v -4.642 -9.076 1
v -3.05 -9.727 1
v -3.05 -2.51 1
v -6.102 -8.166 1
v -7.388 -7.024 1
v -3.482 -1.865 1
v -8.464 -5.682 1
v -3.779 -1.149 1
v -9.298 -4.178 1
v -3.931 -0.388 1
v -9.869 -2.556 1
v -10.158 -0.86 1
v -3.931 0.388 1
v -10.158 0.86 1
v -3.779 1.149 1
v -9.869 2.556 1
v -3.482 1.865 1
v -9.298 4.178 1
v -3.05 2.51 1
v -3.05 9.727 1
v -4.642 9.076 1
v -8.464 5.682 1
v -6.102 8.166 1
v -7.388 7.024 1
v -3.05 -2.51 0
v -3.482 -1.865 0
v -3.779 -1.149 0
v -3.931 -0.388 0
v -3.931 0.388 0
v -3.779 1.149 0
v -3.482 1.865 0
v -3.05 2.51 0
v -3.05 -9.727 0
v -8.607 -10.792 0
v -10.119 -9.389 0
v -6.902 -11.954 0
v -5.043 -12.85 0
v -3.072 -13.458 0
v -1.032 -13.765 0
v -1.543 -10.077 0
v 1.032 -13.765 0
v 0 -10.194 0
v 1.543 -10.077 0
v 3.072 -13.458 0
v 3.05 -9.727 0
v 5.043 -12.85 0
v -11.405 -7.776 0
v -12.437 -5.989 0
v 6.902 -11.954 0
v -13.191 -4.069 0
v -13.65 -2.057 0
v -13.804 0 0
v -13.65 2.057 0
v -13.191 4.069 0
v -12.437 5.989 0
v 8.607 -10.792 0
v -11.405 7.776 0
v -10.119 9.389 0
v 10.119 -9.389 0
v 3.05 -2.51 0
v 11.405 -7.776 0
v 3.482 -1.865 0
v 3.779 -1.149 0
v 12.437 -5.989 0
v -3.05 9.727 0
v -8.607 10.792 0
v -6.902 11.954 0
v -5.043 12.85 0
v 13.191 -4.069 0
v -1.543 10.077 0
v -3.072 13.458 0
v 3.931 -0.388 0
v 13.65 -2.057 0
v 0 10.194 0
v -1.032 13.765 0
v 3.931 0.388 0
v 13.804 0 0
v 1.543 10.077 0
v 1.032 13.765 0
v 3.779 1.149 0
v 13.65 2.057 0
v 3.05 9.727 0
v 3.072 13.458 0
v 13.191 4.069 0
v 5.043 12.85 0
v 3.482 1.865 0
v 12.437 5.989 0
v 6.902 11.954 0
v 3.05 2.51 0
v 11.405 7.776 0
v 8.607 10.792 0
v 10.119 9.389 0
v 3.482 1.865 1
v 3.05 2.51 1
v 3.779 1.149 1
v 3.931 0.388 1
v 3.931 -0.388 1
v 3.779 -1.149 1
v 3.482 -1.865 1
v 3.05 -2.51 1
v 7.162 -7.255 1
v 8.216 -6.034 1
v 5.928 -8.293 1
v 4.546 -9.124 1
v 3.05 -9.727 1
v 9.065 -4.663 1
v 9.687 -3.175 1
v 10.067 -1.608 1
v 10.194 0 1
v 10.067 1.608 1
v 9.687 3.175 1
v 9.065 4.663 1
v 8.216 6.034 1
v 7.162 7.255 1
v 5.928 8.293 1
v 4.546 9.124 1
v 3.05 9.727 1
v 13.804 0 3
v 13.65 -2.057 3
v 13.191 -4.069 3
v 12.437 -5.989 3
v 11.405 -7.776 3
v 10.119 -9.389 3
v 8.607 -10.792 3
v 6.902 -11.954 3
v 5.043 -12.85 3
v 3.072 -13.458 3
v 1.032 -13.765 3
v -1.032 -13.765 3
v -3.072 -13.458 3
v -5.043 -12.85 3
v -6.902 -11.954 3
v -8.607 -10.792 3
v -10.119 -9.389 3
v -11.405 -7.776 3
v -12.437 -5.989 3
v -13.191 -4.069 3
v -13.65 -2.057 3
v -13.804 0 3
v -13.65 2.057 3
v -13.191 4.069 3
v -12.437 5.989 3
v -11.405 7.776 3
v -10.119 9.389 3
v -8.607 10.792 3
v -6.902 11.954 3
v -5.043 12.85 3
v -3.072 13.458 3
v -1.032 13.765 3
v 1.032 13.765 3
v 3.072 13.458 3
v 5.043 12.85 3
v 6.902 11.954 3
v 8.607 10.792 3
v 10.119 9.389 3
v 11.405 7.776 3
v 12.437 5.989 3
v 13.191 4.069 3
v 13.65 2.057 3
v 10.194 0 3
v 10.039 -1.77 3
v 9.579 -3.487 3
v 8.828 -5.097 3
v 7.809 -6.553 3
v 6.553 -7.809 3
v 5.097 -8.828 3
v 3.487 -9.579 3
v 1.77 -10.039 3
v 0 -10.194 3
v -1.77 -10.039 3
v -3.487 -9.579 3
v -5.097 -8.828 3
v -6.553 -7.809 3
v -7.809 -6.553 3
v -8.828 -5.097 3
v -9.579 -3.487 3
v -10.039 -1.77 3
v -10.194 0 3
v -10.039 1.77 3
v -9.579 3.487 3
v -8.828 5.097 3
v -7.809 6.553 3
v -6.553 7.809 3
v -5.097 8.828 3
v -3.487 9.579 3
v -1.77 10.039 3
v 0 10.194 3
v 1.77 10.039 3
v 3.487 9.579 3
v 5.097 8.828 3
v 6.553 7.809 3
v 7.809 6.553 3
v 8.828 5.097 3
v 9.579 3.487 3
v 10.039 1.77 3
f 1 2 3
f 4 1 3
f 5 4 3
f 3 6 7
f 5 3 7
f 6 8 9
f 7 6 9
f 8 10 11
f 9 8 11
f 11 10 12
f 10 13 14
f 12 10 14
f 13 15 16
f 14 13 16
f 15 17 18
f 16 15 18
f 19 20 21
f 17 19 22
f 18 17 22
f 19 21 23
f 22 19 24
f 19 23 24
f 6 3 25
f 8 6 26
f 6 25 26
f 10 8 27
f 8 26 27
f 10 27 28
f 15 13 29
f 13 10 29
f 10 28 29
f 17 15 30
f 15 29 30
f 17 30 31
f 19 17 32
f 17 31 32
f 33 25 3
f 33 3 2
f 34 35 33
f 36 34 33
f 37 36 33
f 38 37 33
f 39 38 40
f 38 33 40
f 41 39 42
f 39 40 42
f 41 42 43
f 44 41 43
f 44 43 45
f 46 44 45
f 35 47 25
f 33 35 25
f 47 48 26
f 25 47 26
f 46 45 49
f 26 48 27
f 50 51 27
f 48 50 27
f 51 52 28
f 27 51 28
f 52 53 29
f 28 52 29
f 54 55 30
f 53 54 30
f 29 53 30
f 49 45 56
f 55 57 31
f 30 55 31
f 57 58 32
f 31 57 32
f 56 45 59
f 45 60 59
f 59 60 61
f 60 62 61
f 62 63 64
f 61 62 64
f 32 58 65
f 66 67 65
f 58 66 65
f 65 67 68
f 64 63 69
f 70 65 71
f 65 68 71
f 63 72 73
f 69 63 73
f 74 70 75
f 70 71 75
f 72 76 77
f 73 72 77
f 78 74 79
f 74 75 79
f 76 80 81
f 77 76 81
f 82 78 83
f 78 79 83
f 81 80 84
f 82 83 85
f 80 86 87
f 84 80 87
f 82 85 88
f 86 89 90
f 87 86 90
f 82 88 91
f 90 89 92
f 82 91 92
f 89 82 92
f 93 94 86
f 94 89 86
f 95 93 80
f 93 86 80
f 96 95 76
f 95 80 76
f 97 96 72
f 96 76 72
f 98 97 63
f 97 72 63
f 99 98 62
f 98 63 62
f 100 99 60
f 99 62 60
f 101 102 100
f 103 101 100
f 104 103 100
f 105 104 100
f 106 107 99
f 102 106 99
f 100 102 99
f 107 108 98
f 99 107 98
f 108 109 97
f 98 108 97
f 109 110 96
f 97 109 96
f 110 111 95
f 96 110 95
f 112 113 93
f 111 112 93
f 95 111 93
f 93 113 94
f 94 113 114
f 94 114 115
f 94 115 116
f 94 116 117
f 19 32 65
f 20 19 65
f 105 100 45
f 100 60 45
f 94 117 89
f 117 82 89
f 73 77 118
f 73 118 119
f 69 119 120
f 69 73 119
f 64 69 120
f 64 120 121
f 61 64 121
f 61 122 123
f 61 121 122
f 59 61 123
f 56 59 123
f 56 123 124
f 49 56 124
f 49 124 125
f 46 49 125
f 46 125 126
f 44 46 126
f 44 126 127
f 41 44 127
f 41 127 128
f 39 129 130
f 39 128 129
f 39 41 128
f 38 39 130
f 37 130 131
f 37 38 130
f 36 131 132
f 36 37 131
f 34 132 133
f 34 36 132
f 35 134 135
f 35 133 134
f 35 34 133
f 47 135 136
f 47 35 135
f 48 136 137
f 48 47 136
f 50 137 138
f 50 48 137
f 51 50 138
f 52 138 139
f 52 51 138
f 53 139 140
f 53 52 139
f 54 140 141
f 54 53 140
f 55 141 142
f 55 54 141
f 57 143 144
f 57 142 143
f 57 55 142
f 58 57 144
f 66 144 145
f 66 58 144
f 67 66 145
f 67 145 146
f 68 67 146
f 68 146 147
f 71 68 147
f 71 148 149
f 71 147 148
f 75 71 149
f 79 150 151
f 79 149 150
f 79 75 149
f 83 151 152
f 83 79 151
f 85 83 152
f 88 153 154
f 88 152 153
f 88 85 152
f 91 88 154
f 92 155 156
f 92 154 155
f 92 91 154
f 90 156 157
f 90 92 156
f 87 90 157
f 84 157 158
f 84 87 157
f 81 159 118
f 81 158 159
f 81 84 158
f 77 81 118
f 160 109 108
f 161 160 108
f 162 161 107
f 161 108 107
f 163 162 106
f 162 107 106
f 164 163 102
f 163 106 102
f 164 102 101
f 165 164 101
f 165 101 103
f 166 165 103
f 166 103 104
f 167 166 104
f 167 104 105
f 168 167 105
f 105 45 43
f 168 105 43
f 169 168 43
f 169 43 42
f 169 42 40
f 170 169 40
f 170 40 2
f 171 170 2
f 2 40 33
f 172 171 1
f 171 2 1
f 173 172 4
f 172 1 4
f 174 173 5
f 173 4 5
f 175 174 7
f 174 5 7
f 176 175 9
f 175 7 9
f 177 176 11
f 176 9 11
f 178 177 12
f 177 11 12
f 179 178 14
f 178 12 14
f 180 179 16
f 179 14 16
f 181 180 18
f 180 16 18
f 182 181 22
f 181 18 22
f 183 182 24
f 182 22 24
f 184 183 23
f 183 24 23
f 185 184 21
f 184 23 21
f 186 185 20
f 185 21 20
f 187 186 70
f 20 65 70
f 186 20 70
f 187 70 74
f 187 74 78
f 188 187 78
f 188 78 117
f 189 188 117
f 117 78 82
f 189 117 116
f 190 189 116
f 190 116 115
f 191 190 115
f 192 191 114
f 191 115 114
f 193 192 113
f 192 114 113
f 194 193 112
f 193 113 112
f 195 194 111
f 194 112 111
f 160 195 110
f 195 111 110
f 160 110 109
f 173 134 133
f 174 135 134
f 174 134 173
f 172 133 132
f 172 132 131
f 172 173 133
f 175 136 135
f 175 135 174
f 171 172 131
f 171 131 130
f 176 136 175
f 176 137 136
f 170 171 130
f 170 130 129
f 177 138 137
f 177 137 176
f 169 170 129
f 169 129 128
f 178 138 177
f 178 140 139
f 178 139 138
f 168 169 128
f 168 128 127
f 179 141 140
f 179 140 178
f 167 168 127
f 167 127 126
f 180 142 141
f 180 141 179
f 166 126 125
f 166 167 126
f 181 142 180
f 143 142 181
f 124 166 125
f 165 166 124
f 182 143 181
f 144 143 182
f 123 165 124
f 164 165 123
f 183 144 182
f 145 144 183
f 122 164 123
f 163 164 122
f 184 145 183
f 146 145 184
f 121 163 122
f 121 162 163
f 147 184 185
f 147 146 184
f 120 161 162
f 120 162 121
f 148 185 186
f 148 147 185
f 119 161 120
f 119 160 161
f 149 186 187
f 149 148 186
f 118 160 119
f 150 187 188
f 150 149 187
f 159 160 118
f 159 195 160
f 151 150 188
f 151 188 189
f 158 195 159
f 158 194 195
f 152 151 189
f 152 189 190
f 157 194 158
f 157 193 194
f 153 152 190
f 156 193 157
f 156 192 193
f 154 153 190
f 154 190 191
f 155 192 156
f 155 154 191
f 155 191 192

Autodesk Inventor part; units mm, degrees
ref_plane "YZ Plane" through (0, 0, 0) normal (1, 0, 0) x (0, 1, 0)
ref_plane "XZ Plane" through (0, 0, 0) normal (0, 1, 0) x (-1, 0, 0)
ref_plane "XY Plane" through (0, 0, 0) normal (0, 0, 1) x (1, 0, 0)
sketch "Эскиз1" plane through (0, 0, 0) normal (0, 0, 1) x (1, 0, 0)
  circle A0 centre (0, 0) radius 13.8038
  circle A1 centre (0, 0) radius 9.815 projected
  line L0 (-3.05, 2.51) -> (-3.05, 9.3291) projected
  line L1 (3.05, 9.3291) -> (3.05, 2.51) projected
  line L2 (-3.05, -9.3291) -> (-3.05, -2.51) projected
  line L3 (3.05, -2.51) -> (3.05, -9.3291) projected
  line L4 (-3.05, -2.51) -> (-3.05, 2.51)
  line L5 (3.05, -2.51) -> (3.05, 2.51)
  circle A2 centre (0, 0) radius 10.1941
extrude "Выдавливание1" add sketch "Эскиз1" along normal blind 3 contours A0
sketch "Эскиз2" plane through (0, 0, 0) normal (0, 0, -1) x (-1, 0, 0)
  line L0 (-3.05, 9.3291) -> (-3.05, 2.51) projected
  circle A0 centre (0, 0) radius 3.95 projected
  line L1 (-3.05, -2.51) -> (-3.05, -9.3291) projected
  line L2 (3.05, -9.3291) -> (3.05, -2.51) projected
  line L3 (3.05, 2.51) -> (3.05, 9.3291) projected
  line L4 (-3.05, -9.3291) -> (-3.05, -9.7271)
  circle A1 centre (0, 0) radius 10.1941 projected
  line L5 (3.05, -9.3291) -> (3.05, -9.7271)
  line L6 (-3.05, 9.3291) -> (-3.05, 9.7271)
  line L7 (3.05, 9.3291) -> (3.05, 9.7271)
extrude "Выдавливание2" add sketch "Эскиз2" against normal blind 1 contours L0 A0 L1 L4 A1 L6 | L3 L7 A1 L5 L2 A0
